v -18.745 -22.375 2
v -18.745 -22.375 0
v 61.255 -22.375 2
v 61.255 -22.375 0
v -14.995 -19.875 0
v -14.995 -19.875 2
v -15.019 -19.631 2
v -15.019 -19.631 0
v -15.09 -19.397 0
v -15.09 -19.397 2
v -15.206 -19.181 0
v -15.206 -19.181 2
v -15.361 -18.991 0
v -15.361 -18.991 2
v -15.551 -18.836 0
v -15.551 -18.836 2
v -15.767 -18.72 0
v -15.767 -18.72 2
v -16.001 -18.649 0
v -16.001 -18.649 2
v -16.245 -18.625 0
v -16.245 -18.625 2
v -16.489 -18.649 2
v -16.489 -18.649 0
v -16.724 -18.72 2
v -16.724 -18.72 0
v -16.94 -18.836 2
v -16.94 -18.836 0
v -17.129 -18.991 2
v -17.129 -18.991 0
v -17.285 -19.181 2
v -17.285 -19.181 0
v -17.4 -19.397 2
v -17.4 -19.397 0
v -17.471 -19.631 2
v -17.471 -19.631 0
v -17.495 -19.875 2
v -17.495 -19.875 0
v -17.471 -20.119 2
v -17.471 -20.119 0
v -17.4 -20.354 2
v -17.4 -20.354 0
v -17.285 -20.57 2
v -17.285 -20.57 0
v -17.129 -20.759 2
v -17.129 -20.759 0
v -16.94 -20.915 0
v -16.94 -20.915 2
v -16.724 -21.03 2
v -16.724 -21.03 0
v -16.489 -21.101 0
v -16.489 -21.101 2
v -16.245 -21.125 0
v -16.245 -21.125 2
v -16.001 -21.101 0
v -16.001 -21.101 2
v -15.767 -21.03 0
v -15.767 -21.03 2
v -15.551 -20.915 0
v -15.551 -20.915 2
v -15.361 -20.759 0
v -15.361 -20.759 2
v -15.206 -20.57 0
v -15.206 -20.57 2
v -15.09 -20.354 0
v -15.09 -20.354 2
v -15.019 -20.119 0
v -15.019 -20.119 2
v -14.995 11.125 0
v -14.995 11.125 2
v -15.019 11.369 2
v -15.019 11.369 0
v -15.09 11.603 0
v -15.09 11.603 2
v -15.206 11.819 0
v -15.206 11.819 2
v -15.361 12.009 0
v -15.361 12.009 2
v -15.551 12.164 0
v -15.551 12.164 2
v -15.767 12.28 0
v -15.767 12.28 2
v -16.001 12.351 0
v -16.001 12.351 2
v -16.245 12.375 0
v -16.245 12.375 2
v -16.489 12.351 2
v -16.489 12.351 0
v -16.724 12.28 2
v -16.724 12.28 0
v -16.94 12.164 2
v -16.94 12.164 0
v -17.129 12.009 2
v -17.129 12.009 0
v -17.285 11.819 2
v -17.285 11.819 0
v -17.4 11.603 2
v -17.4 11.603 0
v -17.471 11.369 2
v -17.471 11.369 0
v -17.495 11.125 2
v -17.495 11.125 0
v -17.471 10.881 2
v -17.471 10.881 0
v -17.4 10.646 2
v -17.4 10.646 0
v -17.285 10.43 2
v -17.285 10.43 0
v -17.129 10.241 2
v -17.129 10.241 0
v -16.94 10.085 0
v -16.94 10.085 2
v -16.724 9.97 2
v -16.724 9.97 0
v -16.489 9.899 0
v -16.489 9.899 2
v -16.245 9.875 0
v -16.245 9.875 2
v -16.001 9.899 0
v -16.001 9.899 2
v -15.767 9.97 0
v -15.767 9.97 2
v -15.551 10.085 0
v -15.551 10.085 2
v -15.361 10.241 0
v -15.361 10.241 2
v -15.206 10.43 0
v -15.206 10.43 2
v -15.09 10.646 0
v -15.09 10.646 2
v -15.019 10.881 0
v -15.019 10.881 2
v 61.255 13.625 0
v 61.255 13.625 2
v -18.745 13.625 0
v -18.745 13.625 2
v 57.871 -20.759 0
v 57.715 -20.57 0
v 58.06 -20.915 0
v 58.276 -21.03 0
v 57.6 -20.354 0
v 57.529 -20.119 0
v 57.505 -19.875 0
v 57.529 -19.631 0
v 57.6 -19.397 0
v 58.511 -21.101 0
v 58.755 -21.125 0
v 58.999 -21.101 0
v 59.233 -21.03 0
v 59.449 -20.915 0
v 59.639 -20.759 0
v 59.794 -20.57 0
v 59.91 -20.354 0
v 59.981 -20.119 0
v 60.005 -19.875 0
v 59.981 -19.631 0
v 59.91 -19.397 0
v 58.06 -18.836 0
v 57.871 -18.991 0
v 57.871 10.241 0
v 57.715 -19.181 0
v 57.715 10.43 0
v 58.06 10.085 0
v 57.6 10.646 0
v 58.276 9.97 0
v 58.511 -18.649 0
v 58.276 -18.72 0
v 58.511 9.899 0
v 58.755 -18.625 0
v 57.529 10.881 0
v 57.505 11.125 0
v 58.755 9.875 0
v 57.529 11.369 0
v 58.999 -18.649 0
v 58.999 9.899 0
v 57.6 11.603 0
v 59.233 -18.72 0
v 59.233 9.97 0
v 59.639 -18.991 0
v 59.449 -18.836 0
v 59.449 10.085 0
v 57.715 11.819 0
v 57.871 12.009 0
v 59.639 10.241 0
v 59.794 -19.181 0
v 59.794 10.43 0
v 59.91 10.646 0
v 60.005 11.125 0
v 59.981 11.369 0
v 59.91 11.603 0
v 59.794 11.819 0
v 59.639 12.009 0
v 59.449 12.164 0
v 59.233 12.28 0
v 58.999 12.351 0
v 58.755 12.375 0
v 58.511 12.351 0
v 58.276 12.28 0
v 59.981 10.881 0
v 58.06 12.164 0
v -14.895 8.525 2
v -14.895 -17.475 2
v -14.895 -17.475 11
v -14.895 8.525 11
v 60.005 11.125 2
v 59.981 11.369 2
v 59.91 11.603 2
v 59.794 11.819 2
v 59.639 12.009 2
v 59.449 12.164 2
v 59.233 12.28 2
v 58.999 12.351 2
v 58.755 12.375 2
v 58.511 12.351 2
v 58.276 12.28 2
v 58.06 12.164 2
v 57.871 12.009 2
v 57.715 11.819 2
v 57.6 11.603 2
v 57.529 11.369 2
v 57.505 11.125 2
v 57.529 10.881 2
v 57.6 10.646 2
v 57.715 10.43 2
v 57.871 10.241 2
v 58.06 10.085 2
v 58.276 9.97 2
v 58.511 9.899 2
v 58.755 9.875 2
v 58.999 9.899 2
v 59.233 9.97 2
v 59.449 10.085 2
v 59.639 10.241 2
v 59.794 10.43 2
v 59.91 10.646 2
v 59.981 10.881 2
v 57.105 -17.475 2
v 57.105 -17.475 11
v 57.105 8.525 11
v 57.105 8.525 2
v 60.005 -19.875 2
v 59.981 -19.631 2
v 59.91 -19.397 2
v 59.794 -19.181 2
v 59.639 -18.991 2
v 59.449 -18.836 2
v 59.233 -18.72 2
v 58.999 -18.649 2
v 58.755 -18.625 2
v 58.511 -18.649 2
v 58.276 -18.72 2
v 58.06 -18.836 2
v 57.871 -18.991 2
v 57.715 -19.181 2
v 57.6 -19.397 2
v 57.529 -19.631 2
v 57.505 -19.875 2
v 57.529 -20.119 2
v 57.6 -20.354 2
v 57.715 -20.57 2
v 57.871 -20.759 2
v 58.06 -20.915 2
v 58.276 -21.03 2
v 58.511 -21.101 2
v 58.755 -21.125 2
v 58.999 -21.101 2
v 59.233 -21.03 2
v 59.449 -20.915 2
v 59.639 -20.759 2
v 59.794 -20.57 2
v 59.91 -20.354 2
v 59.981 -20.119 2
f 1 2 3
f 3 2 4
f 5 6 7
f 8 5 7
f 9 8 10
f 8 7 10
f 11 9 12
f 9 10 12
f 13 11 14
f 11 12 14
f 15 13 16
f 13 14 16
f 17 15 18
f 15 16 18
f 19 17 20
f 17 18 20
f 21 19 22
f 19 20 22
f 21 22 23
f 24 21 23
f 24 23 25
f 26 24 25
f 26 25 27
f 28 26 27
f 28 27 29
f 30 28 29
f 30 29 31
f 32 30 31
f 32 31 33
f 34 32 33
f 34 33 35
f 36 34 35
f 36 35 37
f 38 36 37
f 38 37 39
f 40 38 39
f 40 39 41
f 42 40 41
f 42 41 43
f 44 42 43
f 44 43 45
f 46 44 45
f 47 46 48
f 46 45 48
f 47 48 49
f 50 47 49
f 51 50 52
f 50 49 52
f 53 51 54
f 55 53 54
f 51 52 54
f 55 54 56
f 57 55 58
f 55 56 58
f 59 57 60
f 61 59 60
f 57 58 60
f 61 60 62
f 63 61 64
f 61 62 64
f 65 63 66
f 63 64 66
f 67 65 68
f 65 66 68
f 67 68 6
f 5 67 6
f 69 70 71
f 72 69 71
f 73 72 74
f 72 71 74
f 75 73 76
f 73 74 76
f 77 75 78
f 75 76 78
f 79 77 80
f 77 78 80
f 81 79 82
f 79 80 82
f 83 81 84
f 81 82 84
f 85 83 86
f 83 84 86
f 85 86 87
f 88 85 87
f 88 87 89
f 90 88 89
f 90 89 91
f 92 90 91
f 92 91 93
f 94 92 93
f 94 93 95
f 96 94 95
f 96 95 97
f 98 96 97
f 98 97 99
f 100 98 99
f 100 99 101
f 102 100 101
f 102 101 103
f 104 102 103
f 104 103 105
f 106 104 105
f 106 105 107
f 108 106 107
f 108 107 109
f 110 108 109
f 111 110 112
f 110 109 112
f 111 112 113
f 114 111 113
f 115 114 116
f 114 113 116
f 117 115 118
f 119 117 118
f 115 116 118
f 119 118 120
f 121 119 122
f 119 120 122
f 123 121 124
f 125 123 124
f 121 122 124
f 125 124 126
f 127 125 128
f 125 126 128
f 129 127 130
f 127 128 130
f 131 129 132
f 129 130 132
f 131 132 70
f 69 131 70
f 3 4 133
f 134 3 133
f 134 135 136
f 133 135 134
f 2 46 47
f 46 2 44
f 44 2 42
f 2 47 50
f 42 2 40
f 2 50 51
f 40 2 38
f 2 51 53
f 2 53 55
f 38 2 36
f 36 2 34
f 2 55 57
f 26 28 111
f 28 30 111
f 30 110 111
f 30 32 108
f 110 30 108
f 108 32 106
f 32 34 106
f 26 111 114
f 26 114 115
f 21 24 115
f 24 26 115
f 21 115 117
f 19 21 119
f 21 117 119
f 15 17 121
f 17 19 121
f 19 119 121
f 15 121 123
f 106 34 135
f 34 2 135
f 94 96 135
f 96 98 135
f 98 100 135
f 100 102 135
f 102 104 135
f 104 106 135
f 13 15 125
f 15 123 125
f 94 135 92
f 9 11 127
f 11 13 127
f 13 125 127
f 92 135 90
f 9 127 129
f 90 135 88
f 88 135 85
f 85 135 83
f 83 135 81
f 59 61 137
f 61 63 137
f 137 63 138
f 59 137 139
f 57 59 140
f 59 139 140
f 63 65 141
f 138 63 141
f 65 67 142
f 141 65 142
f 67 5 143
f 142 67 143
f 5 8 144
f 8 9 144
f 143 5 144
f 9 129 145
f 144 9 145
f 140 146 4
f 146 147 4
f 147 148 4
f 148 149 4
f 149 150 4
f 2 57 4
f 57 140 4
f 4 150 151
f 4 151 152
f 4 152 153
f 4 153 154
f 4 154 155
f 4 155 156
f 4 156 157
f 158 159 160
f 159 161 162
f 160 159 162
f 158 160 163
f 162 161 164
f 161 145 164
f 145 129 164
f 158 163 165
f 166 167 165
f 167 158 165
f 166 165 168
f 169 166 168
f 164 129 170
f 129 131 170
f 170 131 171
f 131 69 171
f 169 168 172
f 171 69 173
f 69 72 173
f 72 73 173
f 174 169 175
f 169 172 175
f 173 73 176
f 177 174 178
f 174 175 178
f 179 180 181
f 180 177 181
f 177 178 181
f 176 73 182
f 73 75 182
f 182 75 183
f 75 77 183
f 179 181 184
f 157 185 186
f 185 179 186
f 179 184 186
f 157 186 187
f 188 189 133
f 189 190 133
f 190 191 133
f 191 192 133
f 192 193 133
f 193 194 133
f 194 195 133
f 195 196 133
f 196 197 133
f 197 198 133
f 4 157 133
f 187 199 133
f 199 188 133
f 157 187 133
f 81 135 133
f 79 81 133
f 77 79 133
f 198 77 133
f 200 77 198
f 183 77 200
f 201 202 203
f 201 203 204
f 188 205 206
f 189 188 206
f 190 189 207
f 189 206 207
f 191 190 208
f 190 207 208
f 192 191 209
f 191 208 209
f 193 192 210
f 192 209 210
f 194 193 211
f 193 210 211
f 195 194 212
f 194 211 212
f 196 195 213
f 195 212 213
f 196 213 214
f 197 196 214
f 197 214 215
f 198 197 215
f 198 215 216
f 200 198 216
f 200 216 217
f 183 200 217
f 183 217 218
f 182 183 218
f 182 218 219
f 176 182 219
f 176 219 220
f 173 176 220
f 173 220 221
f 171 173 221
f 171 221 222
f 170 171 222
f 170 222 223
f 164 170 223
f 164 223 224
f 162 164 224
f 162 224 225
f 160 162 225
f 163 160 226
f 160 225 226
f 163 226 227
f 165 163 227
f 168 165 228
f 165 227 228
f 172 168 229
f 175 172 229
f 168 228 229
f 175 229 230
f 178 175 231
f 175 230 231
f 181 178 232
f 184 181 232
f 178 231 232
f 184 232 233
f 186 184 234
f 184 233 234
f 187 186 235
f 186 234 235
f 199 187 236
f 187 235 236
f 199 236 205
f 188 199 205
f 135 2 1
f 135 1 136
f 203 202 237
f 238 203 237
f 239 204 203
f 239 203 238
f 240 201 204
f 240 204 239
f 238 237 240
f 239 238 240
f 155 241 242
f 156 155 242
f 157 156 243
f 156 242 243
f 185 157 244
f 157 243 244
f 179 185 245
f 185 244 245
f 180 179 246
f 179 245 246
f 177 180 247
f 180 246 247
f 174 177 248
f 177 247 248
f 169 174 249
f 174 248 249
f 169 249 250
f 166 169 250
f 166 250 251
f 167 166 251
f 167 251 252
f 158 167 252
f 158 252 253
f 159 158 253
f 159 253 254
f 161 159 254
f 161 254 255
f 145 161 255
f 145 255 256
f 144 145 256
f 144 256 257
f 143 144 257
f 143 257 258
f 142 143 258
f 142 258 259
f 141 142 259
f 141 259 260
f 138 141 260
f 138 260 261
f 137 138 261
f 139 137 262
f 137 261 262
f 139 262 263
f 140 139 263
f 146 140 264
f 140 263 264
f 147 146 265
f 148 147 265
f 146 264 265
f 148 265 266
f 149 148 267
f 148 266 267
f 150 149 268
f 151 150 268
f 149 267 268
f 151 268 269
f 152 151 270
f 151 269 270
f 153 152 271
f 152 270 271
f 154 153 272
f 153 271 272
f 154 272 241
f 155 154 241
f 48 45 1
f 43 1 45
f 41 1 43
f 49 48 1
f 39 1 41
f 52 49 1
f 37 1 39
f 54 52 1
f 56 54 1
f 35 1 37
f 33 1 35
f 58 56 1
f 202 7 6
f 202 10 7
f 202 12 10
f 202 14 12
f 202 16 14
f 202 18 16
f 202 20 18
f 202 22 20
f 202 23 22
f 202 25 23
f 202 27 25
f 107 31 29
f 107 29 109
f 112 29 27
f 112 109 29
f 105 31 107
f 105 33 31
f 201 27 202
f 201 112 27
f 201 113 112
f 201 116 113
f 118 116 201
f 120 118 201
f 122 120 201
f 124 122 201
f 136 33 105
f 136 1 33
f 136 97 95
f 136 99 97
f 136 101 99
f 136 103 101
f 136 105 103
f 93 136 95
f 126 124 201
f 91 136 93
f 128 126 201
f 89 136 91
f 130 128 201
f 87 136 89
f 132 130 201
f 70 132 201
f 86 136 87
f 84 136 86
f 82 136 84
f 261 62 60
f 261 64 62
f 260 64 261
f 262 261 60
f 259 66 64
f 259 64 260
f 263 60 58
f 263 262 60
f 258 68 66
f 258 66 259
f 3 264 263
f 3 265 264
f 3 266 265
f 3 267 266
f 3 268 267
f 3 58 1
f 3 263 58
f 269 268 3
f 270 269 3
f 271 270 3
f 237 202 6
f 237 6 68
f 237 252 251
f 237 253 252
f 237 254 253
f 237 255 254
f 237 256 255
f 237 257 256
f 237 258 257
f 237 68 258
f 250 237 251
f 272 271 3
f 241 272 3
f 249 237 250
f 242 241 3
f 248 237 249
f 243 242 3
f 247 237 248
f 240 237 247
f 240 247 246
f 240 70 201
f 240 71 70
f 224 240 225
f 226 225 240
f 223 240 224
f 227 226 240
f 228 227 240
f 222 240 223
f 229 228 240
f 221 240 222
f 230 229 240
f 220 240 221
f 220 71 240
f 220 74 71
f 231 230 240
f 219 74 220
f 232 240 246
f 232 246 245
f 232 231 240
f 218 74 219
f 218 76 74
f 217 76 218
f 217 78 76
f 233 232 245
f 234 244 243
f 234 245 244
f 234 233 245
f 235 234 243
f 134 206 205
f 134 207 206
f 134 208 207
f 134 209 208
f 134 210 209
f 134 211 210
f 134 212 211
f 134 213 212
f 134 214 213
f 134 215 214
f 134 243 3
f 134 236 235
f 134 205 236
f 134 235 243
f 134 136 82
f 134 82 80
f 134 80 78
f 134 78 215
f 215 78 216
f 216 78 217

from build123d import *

# Parameters (mm, degrees)
SKETCH_1_W          = 80
SKETCH_1_H          = 36
EXTRUDE_1_DEPTH     = 2
SKETCH_2_W          = 72
SKETCH_2_H          = 26
EXTRUDE_2_DEPTH     = 9
SKETCH_3_R          = 1.25
CUT_EXTRUDE_1_DEPTH = 66.831593266


with BuildPart() as part:
    # Эскиз1 → Бобышка-Вытянуть1 (new body)
    with BuildSketch(Plane.XY):
        with Locations((21.254780468, -4.375221601)):
            Rectangle(SKETCH_1_W, SKETCH_1_H)
    extrude(amount=EXTRUDE_1_DEPTH)

    # Эскиз2 → Бобышка-Вытянуть2 (add)
    with BuildSketch(Plane.XY.offset(2)):
        with Locations((21.104780468, -4.475221601)):
            Rectangle(SKETCH_2_W, SKETCH_2_H)
    extrude(amount=EXTRUDE_2_DEPTH)

    # Эскиз3 → Вырез-Вытянуть1 (cut, through all)
    with BuildSketch(Plane.XY.offset(2)):
        with Locations((-16.245219532, 11.124778399)):
            Circle(SKETCH_3_R)
        with Locations((58.754780468, 11.124778399)):
            Circle(SKETCH_3_R)
        with Locations((58.754780468, -19.875221601)):
            Circle(SKETCH_3_R)
        with Locations((-16.245219532, -19.875221601)):
            Circle(SKETCH_3_R)
    extrude(amount=-CUT_EXTRUDE_1_DEPTH, mode=Mode.SUBTRACT)


solid = part.part
